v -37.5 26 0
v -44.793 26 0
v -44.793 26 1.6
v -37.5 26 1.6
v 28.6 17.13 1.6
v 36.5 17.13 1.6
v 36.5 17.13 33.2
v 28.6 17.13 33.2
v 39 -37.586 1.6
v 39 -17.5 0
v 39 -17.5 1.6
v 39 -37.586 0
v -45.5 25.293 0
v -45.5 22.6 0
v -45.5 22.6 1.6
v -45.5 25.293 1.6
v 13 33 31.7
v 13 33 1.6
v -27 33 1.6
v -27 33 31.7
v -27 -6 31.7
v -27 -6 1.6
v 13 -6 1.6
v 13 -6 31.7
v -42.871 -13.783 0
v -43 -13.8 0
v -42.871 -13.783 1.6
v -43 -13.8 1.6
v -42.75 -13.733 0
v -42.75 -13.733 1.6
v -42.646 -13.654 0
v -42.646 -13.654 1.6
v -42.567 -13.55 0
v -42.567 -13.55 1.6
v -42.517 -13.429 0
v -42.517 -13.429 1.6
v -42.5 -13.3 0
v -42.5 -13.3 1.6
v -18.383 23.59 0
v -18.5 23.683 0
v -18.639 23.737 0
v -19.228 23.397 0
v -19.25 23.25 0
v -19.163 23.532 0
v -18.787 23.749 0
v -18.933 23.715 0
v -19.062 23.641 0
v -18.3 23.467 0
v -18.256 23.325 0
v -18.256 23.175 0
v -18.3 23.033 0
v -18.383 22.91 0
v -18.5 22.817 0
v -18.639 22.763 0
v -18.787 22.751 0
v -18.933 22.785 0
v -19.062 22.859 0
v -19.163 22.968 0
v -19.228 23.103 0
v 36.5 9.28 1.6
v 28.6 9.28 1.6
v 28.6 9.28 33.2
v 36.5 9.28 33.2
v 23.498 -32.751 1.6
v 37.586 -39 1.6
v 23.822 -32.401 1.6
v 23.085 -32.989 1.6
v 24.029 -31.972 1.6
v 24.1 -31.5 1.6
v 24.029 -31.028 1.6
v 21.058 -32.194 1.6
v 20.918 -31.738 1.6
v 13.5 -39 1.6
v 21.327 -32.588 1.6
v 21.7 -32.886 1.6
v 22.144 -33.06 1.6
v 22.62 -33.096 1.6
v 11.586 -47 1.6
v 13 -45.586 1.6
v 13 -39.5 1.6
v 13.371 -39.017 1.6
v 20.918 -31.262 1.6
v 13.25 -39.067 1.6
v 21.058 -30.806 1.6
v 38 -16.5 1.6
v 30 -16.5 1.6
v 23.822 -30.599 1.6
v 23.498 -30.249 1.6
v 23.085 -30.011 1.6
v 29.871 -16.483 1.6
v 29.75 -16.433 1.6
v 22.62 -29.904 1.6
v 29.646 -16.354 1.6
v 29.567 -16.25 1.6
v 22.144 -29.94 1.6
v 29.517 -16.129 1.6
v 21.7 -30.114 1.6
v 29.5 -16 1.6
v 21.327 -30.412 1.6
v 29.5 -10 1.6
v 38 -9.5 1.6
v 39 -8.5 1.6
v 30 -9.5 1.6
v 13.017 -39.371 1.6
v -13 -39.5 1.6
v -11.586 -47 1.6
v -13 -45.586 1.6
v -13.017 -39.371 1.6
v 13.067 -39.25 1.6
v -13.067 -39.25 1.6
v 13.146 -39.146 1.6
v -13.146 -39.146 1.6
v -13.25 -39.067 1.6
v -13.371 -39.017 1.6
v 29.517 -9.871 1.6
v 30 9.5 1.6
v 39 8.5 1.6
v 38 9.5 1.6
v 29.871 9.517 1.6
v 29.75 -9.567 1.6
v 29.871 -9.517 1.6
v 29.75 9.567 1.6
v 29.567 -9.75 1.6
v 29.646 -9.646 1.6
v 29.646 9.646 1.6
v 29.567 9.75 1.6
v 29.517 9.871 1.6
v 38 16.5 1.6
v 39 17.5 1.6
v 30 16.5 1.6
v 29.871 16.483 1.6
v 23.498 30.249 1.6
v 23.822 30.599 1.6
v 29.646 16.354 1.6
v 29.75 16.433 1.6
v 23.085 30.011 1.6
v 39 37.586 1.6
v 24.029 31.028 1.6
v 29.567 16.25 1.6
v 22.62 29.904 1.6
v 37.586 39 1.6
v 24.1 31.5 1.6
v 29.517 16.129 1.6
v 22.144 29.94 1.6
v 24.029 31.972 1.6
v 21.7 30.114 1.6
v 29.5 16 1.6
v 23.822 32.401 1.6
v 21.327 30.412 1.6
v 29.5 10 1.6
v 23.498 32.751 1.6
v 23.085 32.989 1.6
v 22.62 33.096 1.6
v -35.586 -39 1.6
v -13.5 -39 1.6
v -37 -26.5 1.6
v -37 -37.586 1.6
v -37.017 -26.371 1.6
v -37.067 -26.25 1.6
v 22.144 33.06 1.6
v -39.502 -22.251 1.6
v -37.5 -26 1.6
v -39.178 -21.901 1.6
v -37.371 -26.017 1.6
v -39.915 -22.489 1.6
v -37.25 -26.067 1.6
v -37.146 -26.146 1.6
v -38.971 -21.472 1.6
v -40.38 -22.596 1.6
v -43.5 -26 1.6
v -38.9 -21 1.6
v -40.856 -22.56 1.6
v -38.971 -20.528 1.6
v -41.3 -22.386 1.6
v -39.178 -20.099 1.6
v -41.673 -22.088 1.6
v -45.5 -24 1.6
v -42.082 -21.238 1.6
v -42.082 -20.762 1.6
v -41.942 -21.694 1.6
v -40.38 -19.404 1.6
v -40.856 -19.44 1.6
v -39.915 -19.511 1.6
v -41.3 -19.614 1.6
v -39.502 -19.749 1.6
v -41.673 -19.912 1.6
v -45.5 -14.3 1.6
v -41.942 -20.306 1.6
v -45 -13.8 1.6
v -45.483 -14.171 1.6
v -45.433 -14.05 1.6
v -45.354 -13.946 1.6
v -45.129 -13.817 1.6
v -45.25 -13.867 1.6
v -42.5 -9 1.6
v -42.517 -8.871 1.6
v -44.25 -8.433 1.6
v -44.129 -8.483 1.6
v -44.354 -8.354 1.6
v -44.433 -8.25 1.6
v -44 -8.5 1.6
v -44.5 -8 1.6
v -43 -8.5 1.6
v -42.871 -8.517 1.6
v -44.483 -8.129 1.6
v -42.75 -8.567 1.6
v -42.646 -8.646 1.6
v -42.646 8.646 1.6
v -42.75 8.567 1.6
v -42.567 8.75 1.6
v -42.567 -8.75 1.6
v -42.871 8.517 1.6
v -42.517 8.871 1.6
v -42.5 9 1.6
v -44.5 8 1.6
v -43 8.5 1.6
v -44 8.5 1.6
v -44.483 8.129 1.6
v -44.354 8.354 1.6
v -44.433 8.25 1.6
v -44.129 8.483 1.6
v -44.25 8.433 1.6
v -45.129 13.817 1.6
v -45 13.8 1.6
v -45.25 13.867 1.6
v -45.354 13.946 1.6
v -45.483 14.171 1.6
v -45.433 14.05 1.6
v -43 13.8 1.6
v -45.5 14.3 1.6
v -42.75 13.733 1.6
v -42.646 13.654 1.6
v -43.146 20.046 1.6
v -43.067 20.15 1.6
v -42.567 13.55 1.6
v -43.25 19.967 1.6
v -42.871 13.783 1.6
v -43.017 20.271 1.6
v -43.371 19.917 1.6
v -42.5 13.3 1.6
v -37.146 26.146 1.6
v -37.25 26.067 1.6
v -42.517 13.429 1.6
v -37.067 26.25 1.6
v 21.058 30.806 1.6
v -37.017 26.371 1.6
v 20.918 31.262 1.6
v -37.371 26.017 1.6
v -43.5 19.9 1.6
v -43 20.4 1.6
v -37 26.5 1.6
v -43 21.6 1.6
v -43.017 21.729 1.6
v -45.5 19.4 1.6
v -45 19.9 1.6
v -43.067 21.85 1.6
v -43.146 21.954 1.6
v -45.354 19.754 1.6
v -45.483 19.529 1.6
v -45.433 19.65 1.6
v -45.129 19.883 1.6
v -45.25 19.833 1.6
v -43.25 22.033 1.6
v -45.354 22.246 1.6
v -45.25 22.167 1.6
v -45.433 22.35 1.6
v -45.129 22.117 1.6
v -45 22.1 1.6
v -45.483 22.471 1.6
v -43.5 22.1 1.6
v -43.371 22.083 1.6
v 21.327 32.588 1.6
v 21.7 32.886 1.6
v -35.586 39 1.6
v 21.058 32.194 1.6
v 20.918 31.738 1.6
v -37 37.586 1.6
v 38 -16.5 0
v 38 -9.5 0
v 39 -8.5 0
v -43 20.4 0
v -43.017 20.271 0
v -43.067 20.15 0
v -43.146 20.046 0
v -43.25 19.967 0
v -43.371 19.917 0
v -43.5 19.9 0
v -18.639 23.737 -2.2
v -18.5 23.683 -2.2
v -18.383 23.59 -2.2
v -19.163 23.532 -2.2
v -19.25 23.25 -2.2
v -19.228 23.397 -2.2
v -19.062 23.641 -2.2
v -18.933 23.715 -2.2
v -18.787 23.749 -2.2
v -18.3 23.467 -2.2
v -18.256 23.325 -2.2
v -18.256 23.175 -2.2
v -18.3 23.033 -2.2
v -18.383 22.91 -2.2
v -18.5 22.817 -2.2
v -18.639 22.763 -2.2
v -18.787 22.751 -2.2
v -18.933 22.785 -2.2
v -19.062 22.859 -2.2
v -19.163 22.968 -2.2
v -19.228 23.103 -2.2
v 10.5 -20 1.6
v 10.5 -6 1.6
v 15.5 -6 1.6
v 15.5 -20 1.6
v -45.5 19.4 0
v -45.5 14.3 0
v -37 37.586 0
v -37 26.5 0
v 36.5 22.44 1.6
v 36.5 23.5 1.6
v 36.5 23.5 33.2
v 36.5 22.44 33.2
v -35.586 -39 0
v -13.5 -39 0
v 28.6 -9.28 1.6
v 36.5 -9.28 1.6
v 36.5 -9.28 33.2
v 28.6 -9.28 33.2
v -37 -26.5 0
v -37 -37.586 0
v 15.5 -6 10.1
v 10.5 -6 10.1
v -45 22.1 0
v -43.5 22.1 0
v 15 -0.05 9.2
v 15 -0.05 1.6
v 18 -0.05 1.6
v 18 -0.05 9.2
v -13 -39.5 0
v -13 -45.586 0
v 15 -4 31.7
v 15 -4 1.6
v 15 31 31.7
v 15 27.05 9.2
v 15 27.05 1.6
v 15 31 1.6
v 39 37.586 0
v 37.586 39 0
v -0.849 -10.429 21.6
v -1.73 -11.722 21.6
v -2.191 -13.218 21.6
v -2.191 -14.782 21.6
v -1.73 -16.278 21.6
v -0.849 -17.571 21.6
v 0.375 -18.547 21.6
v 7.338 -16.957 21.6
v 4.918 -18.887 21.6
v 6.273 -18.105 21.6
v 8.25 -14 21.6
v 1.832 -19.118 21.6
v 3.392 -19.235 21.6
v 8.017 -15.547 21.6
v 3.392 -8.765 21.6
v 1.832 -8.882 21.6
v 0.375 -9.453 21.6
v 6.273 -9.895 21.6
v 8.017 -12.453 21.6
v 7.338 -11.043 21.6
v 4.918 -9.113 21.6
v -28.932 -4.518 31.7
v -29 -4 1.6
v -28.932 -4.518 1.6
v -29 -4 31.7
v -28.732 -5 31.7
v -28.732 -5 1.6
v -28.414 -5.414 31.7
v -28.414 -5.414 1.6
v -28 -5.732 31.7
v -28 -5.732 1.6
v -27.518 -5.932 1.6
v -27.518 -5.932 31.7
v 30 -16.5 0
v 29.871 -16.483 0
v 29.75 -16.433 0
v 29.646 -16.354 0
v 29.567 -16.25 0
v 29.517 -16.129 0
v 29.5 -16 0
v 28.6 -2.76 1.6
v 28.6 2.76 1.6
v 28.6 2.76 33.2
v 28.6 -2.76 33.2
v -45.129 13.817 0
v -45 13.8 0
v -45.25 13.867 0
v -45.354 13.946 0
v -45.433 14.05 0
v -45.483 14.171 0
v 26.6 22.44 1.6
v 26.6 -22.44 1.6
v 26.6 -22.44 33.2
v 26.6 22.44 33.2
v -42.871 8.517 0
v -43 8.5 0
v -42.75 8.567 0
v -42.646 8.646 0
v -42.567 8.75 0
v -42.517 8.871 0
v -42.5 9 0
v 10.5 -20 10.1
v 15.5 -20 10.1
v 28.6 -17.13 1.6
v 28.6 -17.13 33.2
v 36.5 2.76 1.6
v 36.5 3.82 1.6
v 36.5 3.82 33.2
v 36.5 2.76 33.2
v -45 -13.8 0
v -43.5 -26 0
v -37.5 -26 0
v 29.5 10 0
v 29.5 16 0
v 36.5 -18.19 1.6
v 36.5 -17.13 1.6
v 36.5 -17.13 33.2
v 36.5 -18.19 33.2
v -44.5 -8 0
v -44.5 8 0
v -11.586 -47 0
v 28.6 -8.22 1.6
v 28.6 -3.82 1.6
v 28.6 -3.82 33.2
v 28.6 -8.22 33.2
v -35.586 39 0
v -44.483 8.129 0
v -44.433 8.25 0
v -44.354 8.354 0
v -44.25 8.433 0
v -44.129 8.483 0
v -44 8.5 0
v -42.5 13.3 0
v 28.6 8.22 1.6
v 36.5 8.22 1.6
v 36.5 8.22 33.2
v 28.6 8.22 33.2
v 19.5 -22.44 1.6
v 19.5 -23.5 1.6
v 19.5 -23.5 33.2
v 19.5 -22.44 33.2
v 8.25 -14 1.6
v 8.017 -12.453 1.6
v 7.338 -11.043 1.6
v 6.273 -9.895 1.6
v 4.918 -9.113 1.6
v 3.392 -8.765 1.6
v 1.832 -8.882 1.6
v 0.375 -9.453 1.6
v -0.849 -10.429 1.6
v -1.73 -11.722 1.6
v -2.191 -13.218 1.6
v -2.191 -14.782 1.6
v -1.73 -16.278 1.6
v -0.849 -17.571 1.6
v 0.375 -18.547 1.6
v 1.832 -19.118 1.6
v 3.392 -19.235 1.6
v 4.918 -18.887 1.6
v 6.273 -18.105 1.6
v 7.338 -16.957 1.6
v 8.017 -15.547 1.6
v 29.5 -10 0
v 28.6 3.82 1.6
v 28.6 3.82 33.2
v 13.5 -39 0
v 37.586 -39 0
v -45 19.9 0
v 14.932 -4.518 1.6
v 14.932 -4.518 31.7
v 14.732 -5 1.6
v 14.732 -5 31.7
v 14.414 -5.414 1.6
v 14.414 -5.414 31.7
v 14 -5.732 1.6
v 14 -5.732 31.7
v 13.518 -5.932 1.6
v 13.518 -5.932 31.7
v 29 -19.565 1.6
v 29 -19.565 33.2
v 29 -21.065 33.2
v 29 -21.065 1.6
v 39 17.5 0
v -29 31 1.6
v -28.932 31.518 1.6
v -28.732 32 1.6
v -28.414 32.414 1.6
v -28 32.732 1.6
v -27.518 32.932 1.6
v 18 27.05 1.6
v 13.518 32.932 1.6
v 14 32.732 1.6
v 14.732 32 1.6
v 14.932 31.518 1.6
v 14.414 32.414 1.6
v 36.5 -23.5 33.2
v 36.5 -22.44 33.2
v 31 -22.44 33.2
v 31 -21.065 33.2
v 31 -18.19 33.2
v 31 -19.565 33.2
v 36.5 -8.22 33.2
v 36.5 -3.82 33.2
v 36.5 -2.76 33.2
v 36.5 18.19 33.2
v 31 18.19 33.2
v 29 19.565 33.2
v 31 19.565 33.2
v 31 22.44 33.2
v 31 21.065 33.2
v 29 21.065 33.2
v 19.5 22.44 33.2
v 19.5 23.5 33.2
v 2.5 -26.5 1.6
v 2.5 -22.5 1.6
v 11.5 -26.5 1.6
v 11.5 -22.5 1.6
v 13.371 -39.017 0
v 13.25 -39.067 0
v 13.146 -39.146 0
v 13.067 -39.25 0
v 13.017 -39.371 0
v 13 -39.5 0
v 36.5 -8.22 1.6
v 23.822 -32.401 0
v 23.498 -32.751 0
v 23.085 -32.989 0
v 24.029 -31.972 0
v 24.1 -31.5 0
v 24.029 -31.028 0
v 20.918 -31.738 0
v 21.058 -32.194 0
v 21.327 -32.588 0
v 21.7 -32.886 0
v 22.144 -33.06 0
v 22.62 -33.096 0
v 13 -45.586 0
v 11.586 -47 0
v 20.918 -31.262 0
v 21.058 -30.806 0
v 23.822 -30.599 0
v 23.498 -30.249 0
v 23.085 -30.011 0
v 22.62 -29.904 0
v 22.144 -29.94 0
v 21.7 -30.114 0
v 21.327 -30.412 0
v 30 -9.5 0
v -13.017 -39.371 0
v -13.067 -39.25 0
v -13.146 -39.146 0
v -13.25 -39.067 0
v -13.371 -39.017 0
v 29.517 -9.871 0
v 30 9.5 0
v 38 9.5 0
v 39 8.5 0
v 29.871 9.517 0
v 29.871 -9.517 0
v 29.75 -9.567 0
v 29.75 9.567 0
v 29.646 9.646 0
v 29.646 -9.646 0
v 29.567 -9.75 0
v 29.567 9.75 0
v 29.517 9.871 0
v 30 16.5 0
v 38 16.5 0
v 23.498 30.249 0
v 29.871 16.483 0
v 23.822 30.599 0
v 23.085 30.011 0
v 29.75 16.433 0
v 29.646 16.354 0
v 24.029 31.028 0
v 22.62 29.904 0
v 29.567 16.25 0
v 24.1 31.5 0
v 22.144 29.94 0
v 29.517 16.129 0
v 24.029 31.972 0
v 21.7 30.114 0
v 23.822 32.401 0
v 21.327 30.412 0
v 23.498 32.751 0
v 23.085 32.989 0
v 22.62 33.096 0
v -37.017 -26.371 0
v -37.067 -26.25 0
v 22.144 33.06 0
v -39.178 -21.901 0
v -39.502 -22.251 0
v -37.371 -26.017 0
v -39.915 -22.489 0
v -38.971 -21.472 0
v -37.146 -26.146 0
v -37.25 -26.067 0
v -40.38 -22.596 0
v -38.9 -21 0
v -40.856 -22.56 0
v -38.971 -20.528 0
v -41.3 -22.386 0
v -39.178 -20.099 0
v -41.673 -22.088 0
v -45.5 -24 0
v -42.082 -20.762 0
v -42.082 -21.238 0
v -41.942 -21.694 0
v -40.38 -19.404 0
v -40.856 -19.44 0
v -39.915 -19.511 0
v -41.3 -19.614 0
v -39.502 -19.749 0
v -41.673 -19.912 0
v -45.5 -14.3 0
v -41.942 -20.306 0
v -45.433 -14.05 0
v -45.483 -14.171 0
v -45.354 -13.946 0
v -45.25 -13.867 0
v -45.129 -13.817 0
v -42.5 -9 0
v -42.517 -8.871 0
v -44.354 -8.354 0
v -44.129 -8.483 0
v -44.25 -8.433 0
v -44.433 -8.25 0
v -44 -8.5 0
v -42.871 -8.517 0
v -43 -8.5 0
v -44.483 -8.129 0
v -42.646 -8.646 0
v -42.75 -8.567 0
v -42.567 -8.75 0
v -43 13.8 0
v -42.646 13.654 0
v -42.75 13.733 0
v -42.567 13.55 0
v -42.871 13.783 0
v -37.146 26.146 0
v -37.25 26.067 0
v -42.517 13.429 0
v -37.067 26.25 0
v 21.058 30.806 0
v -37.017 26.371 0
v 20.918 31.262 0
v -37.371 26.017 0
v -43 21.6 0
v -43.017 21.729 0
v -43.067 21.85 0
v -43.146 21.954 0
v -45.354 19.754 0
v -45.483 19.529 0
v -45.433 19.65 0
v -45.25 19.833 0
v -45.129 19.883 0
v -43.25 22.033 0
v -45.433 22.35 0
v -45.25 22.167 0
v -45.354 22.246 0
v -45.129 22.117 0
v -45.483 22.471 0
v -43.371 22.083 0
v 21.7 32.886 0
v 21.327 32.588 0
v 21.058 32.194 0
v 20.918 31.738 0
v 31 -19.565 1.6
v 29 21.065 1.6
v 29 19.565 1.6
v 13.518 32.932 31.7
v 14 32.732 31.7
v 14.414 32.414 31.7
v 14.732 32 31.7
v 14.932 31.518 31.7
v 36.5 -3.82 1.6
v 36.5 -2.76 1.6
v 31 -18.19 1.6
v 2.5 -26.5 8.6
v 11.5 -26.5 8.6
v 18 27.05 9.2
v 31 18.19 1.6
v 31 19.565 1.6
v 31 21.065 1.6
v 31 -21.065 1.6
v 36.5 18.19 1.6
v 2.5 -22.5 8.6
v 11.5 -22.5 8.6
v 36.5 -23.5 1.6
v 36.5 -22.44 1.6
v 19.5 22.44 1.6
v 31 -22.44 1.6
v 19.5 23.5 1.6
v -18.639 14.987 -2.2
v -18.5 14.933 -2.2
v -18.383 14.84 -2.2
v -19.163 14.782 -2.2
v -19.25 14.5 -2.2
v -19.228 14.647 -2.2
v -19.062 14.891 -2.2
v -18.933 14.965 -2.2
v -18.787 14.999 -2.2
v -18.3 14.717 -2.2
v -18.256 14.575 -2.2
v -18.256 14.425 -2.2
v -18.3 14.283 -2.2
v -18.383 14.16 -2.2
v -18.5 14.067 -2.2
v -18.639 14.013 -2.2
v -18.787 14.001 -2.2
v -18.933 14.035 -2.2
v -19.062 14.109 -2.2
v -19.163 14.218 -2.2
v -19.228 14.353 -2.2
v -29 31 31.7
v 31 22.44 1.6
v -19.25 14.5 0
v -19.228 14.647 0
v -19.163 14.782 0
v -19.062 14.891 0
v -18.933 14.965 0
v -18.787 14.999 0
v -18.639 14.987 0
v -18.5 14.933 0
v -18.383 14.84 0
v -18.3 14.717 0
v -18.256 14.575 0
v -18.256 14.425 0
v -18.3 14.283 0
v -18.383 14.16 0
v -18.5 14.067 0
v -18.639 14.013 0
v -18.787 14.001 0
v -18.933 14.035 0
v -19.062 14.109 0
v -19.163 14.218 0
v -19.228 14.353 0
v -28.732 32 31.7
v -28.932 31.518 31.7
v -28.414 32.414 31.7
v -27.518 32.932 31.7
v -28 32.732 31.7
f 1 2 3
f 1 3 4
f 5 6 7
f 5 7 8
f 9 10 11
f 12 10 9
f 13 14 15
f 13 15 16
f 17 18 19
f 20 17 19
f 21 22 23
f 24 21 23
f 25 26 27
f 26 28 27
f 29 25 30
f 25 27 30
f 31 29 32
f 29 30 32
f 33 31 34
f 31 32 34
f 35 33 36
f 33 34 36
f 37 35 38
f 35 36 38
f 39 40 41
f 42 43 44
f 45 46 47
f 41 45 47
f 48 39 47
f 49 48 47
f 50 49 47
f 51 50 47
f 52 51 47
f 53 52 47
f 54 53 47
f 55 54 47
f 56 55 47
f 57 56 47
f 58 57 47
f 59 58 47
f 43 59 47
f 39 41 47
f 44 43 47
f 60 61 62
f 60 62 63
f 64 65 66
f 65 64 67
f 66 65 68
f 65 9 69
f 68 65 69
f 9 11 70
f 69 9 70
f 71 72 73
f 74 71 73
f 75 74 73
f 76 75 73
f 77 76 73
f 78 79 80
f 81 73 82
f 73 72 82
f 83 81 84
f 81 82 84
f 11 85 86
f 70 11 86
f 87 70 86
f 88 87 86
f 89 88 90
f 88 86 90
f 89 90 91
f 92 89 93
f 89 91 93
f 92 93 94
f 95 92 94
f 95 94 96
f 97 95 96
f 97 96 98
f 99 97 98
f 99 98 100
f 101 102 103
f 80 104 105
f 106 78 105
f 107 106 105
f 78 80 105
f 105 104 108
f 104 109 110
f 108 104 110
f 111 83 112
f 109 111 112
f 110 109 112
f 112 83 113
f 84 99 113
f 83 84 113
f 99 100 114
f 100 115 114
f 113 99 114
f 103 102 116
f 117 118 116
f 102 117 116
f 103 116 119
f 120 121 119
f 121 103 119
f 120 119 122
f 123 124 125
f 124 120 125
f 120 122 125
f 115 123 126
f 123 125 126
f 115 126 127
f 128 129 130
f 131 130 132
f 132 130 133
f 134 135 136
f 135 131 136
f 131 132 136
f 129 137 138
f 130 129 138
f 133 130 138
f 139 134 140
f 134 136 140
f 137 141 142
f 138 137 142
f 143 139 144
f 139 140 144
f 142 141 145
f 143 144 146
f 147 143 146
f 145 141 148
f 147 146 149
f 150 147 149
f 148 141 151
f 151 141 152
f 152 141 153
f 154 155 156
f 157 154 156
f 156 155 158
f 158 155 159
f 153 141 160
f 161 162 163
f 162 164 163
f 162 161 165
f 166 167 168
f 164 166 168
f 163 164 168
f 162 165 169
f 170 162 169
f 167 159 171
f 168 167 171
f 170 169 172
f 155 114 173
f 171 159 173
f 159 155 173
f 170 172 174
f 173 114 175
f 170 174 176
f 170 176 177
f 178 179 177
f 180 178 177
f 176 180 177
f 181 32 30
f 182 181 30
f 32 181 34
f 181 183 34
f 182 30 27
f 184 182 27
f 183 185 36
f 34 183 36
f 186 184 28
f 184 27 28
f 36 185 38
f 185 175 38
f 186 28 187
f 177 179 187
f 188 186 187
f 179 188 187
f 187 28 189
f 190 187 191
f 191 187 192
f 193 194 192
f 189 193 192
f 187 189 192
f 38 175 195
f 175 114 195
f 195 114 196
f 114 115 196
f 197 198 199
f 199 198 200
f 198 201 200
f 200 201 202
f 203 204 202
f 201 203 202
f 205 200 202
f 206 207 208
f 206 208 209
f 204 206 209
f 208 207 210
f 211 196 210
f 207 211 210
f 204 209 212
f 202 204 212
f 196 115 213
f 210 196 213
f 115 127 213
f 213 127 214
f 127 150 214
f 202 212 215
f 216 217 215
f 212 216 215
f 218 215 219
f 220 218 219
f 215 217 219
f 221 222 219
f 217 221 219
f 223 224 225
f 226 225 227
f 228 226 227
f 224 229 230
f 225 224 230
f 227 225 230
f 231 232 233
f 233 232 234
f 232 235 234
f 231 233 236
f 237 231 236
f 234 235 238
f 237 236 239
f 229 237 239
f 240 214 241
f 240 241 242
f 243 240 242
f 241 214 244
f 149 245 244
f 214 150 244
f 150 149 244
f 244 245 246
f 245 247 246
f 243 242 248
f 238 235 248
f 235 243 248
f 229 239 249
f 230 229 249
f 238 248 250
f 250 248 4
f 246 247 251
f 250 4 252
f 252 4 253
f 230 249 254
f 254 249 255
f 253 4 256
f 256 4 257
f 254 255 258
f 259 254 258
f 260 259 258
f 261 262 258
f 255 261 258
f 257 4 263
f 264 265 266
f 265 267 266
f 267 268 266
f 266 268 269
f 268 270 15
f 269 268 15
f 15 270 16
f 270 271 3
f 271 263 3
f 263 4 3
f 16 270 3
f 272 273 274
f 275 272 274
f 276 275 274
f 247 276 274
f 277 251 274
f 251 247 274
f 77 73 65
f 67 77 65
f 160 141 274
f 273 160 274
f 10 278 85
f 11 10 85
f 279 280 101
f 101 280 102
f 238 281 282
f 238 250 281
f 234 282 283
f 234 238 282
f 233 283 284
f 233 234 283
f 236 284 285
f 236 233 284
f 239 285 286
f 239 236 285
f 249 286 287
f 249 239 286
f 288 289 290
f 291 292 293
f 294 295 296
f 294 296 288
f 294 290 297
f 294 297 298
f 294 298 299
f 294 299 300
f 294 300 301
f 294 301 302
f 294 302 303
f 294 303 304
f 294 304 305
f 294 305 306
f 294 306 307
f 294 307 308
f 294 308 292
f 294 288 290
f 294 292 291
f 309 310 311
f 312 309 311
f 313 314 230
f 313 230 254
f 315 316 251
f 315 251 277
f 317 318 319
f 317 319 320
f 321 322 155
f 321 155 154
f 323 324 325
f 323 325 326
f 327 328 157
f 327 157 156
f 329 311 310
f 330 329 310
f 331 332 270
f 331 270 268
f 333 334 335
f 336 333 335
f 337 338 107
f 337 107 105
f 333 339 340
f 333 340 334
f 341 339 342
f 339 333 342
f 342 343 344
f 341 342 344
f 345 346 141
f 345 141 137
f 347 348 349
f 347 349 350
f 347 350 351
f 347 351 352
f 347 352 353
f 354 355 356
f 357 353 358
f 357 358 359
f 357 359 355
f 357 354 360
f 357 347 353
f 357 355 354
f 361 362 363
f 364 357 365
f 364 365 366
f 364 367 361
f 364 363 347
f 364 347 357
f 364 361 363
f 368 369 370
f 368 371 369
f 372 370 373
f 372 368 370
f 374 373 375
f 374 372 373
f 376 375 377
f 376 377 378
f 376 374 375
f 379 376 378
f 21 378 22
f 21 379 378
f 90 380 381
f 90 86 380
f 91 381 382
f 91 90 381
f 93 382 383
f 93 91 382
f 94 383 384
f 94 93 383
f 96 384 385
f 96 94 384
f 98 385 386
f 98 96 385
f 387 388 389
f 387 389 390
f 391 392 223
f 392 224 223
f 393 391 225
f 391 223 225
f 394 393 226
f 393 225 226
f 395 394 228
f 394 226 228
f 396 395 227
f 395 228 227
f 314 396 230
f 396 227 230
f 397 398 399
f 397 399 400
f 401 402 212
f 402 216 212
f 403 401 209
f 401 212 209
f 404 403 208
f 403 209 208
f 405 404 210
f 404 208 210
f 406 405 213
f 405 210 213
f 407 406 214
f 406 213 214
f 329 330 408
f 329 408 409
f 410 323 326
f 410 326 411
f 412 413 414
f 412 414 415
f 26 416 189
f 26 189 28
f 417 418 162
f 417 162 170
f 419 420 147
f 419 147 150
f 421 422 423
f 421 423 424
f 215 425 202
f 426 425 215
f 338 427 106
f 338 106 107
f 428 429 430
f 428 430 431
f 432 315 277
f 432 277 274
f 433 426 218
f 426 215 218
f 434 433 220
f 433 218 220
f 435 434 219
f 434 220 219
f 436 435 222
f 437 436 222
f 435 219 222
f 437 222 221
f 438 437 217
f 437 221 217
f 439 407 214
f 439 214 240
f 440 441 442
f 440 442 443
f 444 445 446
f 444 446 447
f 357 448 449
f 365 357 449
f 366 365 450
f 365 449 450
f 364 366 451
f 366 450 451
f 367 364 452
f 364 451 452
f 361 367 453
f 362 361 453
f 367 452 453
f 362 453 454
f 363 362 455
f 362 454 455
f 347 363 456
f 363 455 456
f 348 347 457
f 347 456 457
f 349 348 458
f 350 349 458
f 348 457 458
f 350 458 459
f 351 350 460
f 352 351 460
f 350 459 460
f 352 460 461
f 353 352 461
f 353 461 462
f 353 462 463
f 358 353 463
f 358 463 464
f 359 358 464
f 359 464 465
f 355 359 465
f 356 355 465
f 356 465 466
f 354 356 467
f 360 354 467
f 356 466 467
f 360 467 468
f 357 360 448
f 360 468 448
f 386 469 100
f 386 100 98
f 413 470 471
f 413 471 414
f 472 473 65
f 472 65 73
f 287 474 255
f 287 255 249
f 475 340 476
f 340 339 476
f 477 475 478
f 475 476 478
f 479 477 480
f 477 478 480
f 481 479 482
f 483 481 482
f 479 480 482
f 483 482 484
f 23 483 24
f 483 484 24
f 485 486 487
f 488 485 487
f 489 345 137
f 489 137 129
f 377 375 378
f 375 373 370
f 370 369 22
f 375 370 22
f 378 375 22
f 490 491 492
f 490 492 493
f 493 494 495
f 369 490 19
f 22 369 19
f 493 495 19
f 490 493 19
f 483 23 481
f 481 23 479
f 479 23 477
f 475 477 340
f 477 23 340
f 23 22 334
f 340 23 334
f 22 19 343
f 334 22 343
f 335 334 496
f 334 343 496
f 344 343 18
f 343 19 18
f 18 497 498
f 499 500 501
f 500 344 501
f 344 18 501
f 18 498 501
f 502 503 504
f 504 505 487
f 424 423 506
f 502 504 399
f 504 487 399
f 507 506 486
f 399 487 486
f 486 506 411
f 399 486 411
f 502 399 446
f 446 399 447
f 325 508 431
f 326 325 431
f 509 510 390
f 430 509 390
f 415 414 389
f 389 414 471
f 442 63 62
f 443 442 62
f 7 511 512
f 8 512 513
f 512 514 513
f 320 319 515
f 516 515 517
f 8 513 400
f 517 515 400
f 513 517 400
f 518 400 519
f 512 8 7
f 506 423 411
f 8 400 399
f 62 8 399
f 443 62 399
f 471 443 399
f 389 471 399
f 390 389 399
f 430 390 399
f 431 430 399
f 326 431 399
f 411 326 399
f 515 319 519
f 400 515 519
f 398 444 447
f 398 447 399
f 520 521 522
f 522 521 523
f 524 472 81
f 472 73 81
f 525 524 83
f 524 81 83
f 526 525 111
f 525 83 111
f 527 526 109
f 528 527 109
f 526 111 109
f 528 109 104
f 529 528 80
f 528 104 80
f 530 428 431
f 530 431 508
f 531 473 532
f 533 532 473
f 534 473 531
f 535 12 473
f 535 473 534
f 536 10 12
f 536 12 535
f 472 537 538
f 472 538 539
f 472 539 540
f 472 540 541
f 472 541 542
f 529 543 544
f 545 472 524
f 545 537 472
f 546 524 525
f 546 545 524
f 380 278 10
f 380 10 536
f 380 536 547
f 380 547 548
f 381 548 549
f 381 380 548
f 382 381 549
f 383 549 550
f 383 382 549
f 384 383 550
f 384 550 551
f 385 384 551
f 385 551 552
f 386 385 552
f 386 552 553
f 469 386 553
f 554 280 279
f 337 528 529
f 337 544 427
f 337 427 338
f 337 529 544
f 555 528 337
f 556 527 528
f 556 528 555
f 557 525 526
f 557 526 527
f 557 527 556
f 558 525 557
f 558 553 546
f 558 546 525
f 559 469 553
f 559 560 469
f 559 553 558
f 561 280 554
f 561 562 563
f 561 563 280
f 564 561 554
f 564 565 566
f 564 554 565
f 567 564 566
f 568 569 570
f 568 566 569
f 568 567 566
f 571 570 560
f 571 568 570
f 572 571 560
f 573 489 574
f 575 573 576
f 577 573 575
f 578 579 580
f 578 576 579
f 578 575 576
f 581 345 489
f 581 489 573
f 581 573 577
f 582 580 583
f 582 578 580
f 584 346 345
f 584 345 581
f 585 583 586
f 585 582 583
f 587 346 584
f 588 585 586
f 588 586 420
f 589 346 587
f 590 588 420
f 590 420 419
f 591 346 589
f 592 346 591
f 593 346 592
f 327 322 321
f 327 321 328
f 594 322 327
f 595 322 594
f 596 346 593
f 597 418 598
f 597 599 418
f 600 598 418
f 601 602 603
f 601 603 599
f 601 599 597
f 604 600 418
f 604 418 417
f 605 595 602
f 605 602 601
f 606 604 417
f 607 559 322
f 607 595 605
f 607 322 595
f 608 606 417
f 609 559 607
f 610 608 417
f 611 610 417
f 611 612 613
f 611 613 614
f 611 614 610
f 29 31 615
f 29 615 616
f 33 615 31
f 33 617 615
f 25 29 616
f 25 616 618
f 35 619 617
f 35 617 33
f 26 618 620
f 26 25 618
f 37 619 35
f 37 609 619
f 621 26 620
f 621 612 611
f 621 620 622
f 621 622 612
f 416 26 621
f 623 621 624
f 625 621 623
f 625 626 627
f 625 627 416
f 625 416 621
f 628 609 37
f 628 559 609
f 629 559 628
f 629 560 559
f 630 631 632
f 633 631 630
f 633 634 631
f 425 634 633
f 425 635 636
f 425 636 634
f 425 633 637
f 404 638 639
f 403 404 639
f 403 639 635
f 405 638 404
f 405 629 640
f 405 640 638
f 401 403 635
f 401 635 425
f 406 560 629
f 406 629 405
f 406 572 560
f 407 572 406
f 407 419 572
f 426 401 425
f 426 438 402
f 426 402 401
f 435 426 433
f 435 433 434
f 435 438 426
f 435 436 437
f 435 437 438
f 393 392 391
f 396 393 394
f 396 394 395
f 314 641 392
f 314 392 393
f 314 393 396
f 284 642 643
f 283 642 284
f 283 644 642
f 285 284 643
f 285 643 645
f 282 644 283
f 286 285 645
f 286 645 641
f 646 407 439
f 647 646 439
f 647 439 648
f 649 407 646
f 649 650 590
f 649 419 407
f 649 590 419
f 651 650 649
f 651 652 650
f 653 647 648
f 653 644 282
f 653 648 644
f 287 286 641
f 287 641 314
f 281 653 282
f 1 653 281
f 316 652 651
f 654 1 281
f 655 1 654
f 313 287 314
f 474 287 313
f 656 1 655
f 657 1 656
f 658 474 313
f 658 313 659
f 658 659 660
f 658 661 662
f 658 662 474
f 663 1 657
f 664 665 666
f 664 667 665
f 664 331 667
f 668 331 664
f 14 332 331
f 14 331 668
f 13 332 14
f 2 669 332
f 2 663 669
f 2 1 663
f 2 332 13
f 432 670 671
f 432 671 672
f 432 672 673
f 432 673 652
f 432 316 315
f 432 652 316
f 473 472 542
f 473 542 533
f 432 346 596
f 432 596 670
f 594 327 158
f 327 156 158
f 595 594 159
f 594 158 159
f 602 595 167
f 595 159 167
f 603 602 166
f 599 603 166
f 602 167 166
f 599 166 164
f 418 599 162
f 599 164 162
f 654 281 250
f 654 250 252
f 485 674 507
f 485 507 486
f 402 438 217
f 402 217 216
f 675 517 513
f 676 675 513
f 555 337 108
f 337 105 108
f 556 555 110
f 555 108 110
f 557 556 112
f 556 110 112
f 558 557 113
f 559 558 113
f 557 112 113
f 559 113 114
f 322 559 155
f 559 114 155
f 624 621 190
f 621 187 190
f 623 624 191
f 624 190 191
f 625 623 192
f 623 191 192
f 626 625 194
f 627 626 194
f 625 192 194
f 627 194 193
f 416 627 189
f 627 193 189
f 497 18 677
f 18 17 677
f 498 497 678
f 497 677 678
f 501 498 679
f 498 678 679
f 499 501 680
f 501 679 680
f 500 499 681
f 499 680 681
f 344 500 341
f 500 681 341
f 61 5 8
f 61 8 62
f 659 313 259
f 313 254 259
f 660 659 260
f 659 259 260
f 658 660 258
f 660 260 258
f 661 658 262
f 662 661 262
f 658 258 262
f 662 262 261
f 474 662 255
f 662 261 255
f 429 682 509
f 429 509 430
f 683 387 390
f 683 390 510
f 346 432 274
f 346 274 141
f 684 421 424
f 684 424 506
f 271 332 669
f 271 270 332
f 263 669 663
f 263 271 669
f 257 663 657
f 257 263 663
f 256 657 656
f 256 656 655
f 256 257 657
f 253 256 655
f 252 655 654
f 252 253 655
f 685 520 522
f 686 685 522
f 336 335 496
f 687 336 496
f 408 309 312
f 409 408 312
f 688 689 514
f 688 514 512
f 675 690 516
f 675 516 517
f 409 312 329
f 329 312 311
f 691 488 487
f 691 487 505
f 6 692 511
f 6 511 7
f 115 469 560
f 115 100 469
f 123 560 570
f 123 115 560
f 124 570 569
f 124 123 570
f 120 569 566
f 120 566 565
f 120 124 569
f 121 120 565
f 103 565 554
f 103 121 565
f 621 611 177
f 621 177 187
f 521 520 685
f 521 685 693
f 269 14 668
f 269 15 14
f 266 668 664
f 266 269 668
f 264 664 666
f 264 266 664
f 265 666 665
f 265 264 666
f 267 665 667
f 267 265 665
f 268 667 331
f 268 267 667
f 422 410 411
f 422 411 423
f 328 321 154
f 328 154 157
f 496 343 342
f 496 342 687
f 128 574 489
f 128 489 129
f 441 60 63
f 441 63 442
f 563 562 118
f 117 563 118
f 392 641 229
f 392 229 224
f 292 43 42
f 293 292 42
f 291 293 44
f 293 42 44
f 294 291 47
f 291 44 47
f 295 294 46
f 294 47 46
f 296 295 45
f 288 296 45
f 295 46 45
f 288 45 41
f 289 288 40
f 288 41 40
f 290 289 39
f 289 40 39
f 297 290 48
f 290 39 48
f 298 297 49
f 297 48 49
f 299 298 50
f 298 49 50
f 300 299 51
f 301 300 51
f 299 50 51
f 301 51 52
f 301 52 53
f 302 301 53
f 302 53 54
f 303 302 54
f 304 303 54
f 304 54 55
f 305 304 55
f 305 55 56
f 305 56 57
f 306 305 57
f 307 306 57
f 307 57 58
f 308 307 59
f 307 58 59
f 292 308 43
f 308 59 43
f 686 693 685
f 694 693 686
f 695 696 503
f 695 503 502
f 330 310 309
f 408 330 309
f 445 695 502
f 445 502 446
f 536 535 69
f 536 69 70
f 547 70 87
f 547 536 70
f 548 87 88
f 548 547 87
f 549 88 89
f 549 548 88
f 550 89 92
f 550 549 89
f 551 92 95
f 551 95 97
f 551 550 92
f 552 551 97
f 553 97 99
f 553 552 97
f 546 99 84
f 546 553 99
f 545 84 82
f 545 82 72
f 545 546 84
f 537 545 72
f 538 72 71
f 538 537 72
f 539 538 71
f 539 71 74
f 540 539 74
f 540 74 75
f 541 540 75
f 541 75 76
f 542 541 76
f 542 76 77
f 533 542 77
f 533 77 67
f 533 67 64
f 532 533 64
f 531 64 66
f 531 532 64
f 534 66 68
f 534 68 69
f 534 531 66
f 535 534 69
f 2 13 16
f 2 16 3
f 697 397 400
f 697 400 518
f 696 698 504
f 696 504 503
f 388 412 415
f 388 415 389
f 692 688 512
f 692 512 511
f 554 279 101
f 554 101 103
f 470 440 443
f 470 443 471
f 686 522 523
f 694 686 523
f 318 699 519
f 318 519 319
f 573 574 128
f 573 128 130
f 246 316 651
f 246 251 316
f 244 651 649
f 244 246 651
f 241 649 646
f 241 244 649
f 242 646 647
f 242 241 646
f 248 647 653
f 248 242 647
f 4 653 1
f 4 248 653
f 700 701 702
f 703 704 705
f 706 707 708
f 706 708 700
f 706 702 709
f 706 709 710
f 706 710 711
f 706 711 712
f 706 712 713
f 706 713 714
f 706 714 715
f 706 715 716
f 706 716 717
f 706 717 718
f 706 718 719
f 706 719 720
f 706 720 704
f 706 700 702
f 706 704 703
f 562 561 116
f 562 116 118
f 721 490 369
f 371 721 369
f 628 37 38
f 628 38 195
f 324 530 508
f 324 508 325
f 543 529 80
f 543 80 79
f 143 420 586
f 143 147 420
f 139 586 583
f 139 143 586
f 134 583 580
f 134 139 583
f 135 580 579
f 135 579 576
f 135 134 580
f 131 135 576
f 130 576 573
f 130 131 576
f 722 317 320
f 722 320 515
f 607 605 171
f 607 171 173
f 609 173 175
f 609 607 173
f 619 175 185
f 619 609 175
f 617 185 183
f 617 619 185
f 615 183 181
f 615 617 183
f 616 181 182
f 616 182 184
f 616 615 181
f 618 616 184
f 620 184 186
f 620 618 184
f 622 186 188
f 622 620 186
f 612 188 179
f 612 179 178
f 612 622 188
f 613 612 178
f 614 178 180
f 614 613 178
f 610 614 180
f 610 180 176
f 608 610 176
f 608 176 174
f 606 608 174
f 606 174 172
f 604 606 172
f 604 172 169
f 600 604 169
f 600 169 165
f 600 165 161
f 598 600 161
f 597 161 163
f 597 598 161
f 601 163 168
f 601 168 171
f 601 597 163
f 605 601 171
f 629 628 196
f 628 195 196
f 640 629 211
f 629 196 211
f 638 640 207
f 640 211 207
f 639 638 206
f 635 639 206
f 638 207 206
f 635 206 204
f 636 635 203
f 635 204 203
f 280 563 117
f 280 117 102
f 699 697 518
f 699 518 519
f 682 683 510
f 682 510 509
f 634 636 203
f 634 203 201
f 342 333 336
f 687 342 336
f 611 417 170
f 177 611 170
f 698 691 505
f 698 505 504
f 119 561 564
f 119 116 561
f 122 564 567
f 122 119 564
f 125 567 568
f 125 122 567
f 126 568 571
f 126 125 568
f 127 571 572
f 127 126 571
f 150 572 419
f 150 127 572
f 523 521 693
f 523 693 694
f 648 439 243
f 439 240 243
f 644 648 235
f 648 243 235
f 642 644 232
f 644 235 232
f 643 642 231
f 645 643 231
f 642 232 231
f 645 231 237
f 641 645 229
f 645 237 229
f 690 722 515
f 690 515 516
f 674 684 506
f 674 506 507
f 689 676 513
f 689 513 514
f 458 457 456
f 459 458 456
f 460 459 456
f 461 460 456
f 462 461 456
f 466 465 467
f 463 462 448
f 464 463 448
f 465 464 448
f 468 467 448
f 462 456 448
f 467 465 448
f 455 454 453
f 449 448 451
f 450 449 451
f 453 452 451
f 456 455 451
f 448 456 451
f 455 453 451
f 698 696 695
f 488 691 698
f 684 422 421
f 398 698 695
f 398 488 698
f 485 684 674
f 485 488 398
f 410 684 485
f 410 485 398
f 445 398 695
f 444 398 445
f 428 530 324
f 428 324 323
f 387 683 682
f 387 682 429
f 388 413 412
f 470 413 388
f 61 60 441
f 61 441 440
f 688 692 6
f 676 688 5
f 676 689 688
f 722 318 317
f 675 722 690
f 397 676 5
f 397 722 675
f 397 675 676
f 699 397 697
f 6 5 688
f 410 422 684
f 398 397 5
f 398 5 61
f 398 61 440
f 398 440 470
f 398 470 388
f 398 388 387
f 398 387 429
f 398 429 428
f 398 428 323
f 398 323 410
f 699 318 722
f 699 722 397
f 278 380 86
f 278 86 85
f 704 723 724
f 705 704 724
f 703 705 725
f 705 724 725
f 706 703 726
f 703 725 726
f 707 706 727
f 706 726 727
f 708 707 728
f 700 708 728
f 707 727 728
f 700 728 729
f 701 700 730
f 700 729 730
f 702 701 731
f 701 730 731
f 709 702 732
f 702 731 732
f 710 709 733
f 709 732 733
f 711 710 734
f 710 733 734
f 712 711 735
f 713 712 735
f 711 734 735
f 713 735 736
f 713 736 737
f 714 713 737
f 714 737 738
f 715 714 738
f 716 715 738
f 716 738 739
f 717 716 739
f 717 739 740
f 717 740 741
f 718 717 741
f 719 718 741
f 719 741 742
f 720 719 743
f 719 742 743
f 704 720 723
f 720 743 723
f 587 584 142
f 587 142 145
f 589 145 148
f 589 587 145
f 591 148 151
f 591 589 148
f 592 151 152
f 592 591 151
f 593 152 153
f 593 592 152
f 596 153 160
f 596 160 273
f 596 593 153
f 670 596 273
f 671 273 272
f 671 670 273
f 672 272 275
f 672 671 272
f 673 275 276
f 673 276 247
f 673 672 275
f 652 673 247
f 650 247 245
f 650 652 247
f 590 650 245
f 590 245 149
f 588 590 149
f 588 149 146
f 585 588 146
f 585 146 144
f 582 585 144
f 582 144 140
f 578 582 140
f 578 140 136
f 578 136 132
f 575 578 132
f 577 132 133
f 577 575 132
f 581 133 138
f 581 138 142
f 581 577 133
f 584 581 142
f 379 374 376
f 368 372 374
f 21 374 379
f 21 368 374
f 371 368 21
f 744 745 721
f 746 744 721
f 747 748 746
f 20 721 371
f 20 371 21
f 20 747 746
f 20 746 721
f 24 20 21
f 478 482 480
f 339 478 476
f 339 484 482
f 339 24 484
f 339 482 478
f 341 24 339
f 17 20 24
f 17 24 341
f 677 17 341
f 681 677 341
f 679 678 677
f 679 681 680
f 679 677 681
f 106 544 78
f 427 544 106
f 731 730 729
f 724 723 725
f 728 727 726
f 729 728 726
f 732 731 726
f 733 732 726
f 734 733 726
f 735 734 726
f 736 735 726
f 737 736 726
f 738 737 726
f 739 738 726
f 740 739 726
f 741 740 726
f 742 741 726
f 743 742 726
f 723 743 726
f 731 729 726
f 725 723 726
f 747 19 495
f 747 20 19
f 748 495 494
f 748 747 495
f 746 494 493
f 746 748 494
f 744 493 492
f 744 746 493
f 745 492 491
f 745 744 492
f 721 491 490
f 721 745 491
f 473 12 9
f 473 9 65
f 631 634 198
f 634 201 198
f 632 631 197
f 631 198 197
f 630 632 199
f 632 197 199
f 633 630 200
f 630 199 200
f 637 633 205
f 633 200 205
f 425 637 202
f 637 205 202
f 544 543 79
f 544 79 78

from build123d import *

# Parameters (mm, degrees)
SKETCH1_R            = 1.6
BOSS_EXTRUDE1_DEPTH  = 1.6
CHAMFER1_SIZE        = 2
CHAMFER2_SIZE        = 1
FILLET1_R            = 0.5
TRANSFORMER1_DEPTH   = 30.1
SKETCH2_3_W          = 3
SKETCH2_3_H          = 27.1
TRANSFORMER2_DEPTH   = 7.6
SKETCH3_R            = 0.5
TRANSFORMER3_DEPTH   = 2.2
TRANSFORMER3_2_DEPTH = 2.2
SKETCH2_4_R          = 5.25
CAP1_DEPTH           = 20
HEATSINK_DEPTH       = 31.6
RESISTOR_DEPTH       = 8.5
SKETCH2_7_W          = 9
SKETCH2_7_H          = 4
CAP2_DEPTH           = 7
FILLET2_R            = 2


with BuildPart() as part:
    # Sketch1 → Boss-Extrude1 (new body)
    with BuildSketch(Plane.XY):
        Polygon((-45.5, -26), (-45.5, -13.8), (-42.5, -13.8), (-42.5, -8.5), (-44.5, -8.5), (-44.5, 8.5), (-42.5, 8.5), (-42.5, 13.8), (-45.5, 13.8), (-45.5, 19.9), (-43, 19.9), (-43, 22.1), (-45.5, 22.1), (-45.5, 25.292893219), (-44.792893219, 26), (-37, 26), (-37, 37.585786438), (-35.585786438, 39), (37.585786438, 39), (39, 37.585786438), (39, 16.5), (29.5, 16.5), (29.5, 9.5), (39, 9.5), (39, -9.5), (29.5, -9.5), (29.5, -16.5), (39, -16.5), (39, -37.585786438), (37.585786438, -39), (13, -39), (13, -45.585786438), (11.585786438, -47), (-11.585786438, -47), (-13, -45.585786438), (-13, -39), (-35.585786438, -39), (-37, -37.585786438), (-37, -26), align=None)
        with Locations((-40.5, -21)):
            Circle(SKETCH1_R, mode=Mode.SUBTRACT)
        with Locations((22.5, 31.5)):
            Circle(SKETCH1_R, mode=Mode.SUBTRACT)
        with Locations((22.5, -31.5)):
            Circle(SKETCH1_R, mode=Mode.SUBTRACT)
    extrude(amount=BOSS_EXTRUDE1_DEPTH)

    # Chamfer1
    chamfer1_edges = [part.edges().sort_by_distance(p)[0] for p in [
        (-45.5, -26, 0.8),
    ]]
    chamfer(chamfer1_edges, length=CHAMFER1_SIZE)

    # Chamfer2
    chamfer2_edges = [part.edges().sort_by_distance(p)[0] for p in [
        (39, 16.5, 0.8),
        (39, 9.5, 0.8),
        (39, -16.5, 0.8),
        (39, -9.5, 0.8),
    ]]
    chamfer(chamfer2_edges, length=CHAMFER2_SIZE)

    # Fillet1
    fillet1_edges = [part.edges().sort_by_distance(p)[0] for p in [
        (-45.5, 19.9, 0.8),
        (-45.5, 22.1, 0.8),
        (-45.5, 13.8, 0.8),
        (-44.5, 8.5, 0.8),
        (-45.5, -13.8, 0.8),
        (-44.5, -8.5, 0.8),
        (-37, 26, 0.8),
        (29.5, 16.5, 0.8),
        (29.5, 9.5, 0.8),
        (29.5, -9.5, 0.8),
        (29.5, -16.5, 0.8),
        (13, -39, 0.8),
        (-13, -39, 0.8),
        (-37, -26, 0.8),
        (-43, 19.9, 0.8),
        (-43, 22.1, 0.8),
        (-42.5, 13.8, 0.8),
        (-42.5, 8.5, 0.8),
        (-42.5, -13.8, 0.8),
        (-42.5, -8.5, 0.8),
    ]]
    fillet(fillet1_edges, radius=FILLET1_R)


with BuildPart() as body_2:
    # Sketch2 → transformer1 (new body)
    with BuildSketch(Plane.XY.offset(1.6)):
        Polygon((15, -0.05), (15, 27.05), (15, 33), (-29, 33), (-29, -6), (10.5, -6), (15, -6), align=None)
    extrude(amount=TRANSFORMER1_DEPTH)

    # Sketch2<3> → transformer2 (add)
    with BuildSketch(Plane.XY.offset(1.6)):
        with Locations((16.5, 13.5)):
            Rectangle(SKETCH2_3_W, SKETCH2_3_H)
    extrude(amount=TRANSFORMER2_DEPTH)

    # Fillet2
    fillet2_edges = [body_2.edges().sort_by_distance(p)[0] for p in [
        (-29, 33, 16.65),
        (15, 33, 16.65),
        (15, -6, 16.65),
        (-29, -6, 16.65),
    ]]
    fillet(fillet2_edges, radius=FILLET2_R)


with BuildPart() as body_3:
    # Sketch3 → transformer3 (new body)
    with BuildSketch(Plane(origin=(0, 0, 0), x_dir=(-1, 0, 0), z_dir=(0, 0, -1))):
        with Locations((18.75, 14.5)):
            Circle(SKETCH3_R)
    extrude(amount=TRANSFORMER3_DEPTH)


with BuildPart() as body_4:
    # Sketch3 → transformer3 2 (new body)
    with BuildSketch(Plane(origin=(0, 0, 0), x_dir=(-1, 0, 0), z_dir=(0, 0, -1))):
        with Locations((18.75, 23.25)):
            Circle(SKETCH3_R)
    extrude(amount=TRANSFORMER3_2_DEPTH)


with BuildPart() as body_5:
    # Sketch2<4> → cap1 (new body)
    with BuildSketch(Plane.XY.offset(1.6)):
        with Locations((3, -14)):
            Circle(SKETCH2_4_R)
    extrude(amount=CAP1_DEPTH)


with BuildPart() as body_6:
    # Sketch2<5> → heatsink (new body)
    with BuildSketch(Plane.XY.offset(1.6)):
        Polygon((28.6, 17.13), (36.5, 17.13), (36.5, 18.19), (31, 18.19), (31, 19.565), (29, 19.565), (29, 21.065), (31, 21.065), (31, 22.44), (36.5, 22.44), (36.5, 23.5), (19.5, 23.5), (19.5, 22.44), (26.6, 22.44), (26.6, -22.44), (19.5, -22.44), (19.5, -23.5), (36.5, -23.5), (36.5, -22.44), (31, -22.44), (31, -21.065), (29, -21.065), (29, -19.565), (31, -19.565), (31, -18.19), (36.5, -18.19), (36.5, -17.13), (28.6, -17.13), (28.6, -9.28), (36.5, -9.28), (36.5, -8.22), (28.6, -8.22), (28.6, -3.82), (36.5, -3.82), (36.5, -2.76), (28.6, -2.76), (28.6, 2.76), (36.5, 2.76), (36.5, 3.82), (28.6, 3.82), (28.6, 8.22), (36.5, 8.22), (36.5, 9.28), (28.6, 9.28), align=None)
    extrude(amount=HEATSINK_DEPTH)


with BuildPart() as body_7:
    # Sketch2<6> → resistor (new body)
    with BuildSketch(Plane.XY.offset(1.6)):
        Polygon((15.5, -6), (15, -6), (10.5, -6), (10.5, -20), (15.5, -20), align=None)
    extrude(amount=RESISTOR_DEPTH)


with BuildPart() as body_8:
    # Sketch2<7> → cap2 (new body)
    with BuildSketch(Plane.XY.offset(1.6)):
        with Locations((7, -24.5)):
            Rectangle(SKETCH2_7_W, SKETCH2_7_H)
    extrude(amount=CAP2_DEPTH)


solid = Compound([part.part, body_2.part, body_3.part, body_4.part, body_5.part, body_6.part, body_7.part, body_8.part])
